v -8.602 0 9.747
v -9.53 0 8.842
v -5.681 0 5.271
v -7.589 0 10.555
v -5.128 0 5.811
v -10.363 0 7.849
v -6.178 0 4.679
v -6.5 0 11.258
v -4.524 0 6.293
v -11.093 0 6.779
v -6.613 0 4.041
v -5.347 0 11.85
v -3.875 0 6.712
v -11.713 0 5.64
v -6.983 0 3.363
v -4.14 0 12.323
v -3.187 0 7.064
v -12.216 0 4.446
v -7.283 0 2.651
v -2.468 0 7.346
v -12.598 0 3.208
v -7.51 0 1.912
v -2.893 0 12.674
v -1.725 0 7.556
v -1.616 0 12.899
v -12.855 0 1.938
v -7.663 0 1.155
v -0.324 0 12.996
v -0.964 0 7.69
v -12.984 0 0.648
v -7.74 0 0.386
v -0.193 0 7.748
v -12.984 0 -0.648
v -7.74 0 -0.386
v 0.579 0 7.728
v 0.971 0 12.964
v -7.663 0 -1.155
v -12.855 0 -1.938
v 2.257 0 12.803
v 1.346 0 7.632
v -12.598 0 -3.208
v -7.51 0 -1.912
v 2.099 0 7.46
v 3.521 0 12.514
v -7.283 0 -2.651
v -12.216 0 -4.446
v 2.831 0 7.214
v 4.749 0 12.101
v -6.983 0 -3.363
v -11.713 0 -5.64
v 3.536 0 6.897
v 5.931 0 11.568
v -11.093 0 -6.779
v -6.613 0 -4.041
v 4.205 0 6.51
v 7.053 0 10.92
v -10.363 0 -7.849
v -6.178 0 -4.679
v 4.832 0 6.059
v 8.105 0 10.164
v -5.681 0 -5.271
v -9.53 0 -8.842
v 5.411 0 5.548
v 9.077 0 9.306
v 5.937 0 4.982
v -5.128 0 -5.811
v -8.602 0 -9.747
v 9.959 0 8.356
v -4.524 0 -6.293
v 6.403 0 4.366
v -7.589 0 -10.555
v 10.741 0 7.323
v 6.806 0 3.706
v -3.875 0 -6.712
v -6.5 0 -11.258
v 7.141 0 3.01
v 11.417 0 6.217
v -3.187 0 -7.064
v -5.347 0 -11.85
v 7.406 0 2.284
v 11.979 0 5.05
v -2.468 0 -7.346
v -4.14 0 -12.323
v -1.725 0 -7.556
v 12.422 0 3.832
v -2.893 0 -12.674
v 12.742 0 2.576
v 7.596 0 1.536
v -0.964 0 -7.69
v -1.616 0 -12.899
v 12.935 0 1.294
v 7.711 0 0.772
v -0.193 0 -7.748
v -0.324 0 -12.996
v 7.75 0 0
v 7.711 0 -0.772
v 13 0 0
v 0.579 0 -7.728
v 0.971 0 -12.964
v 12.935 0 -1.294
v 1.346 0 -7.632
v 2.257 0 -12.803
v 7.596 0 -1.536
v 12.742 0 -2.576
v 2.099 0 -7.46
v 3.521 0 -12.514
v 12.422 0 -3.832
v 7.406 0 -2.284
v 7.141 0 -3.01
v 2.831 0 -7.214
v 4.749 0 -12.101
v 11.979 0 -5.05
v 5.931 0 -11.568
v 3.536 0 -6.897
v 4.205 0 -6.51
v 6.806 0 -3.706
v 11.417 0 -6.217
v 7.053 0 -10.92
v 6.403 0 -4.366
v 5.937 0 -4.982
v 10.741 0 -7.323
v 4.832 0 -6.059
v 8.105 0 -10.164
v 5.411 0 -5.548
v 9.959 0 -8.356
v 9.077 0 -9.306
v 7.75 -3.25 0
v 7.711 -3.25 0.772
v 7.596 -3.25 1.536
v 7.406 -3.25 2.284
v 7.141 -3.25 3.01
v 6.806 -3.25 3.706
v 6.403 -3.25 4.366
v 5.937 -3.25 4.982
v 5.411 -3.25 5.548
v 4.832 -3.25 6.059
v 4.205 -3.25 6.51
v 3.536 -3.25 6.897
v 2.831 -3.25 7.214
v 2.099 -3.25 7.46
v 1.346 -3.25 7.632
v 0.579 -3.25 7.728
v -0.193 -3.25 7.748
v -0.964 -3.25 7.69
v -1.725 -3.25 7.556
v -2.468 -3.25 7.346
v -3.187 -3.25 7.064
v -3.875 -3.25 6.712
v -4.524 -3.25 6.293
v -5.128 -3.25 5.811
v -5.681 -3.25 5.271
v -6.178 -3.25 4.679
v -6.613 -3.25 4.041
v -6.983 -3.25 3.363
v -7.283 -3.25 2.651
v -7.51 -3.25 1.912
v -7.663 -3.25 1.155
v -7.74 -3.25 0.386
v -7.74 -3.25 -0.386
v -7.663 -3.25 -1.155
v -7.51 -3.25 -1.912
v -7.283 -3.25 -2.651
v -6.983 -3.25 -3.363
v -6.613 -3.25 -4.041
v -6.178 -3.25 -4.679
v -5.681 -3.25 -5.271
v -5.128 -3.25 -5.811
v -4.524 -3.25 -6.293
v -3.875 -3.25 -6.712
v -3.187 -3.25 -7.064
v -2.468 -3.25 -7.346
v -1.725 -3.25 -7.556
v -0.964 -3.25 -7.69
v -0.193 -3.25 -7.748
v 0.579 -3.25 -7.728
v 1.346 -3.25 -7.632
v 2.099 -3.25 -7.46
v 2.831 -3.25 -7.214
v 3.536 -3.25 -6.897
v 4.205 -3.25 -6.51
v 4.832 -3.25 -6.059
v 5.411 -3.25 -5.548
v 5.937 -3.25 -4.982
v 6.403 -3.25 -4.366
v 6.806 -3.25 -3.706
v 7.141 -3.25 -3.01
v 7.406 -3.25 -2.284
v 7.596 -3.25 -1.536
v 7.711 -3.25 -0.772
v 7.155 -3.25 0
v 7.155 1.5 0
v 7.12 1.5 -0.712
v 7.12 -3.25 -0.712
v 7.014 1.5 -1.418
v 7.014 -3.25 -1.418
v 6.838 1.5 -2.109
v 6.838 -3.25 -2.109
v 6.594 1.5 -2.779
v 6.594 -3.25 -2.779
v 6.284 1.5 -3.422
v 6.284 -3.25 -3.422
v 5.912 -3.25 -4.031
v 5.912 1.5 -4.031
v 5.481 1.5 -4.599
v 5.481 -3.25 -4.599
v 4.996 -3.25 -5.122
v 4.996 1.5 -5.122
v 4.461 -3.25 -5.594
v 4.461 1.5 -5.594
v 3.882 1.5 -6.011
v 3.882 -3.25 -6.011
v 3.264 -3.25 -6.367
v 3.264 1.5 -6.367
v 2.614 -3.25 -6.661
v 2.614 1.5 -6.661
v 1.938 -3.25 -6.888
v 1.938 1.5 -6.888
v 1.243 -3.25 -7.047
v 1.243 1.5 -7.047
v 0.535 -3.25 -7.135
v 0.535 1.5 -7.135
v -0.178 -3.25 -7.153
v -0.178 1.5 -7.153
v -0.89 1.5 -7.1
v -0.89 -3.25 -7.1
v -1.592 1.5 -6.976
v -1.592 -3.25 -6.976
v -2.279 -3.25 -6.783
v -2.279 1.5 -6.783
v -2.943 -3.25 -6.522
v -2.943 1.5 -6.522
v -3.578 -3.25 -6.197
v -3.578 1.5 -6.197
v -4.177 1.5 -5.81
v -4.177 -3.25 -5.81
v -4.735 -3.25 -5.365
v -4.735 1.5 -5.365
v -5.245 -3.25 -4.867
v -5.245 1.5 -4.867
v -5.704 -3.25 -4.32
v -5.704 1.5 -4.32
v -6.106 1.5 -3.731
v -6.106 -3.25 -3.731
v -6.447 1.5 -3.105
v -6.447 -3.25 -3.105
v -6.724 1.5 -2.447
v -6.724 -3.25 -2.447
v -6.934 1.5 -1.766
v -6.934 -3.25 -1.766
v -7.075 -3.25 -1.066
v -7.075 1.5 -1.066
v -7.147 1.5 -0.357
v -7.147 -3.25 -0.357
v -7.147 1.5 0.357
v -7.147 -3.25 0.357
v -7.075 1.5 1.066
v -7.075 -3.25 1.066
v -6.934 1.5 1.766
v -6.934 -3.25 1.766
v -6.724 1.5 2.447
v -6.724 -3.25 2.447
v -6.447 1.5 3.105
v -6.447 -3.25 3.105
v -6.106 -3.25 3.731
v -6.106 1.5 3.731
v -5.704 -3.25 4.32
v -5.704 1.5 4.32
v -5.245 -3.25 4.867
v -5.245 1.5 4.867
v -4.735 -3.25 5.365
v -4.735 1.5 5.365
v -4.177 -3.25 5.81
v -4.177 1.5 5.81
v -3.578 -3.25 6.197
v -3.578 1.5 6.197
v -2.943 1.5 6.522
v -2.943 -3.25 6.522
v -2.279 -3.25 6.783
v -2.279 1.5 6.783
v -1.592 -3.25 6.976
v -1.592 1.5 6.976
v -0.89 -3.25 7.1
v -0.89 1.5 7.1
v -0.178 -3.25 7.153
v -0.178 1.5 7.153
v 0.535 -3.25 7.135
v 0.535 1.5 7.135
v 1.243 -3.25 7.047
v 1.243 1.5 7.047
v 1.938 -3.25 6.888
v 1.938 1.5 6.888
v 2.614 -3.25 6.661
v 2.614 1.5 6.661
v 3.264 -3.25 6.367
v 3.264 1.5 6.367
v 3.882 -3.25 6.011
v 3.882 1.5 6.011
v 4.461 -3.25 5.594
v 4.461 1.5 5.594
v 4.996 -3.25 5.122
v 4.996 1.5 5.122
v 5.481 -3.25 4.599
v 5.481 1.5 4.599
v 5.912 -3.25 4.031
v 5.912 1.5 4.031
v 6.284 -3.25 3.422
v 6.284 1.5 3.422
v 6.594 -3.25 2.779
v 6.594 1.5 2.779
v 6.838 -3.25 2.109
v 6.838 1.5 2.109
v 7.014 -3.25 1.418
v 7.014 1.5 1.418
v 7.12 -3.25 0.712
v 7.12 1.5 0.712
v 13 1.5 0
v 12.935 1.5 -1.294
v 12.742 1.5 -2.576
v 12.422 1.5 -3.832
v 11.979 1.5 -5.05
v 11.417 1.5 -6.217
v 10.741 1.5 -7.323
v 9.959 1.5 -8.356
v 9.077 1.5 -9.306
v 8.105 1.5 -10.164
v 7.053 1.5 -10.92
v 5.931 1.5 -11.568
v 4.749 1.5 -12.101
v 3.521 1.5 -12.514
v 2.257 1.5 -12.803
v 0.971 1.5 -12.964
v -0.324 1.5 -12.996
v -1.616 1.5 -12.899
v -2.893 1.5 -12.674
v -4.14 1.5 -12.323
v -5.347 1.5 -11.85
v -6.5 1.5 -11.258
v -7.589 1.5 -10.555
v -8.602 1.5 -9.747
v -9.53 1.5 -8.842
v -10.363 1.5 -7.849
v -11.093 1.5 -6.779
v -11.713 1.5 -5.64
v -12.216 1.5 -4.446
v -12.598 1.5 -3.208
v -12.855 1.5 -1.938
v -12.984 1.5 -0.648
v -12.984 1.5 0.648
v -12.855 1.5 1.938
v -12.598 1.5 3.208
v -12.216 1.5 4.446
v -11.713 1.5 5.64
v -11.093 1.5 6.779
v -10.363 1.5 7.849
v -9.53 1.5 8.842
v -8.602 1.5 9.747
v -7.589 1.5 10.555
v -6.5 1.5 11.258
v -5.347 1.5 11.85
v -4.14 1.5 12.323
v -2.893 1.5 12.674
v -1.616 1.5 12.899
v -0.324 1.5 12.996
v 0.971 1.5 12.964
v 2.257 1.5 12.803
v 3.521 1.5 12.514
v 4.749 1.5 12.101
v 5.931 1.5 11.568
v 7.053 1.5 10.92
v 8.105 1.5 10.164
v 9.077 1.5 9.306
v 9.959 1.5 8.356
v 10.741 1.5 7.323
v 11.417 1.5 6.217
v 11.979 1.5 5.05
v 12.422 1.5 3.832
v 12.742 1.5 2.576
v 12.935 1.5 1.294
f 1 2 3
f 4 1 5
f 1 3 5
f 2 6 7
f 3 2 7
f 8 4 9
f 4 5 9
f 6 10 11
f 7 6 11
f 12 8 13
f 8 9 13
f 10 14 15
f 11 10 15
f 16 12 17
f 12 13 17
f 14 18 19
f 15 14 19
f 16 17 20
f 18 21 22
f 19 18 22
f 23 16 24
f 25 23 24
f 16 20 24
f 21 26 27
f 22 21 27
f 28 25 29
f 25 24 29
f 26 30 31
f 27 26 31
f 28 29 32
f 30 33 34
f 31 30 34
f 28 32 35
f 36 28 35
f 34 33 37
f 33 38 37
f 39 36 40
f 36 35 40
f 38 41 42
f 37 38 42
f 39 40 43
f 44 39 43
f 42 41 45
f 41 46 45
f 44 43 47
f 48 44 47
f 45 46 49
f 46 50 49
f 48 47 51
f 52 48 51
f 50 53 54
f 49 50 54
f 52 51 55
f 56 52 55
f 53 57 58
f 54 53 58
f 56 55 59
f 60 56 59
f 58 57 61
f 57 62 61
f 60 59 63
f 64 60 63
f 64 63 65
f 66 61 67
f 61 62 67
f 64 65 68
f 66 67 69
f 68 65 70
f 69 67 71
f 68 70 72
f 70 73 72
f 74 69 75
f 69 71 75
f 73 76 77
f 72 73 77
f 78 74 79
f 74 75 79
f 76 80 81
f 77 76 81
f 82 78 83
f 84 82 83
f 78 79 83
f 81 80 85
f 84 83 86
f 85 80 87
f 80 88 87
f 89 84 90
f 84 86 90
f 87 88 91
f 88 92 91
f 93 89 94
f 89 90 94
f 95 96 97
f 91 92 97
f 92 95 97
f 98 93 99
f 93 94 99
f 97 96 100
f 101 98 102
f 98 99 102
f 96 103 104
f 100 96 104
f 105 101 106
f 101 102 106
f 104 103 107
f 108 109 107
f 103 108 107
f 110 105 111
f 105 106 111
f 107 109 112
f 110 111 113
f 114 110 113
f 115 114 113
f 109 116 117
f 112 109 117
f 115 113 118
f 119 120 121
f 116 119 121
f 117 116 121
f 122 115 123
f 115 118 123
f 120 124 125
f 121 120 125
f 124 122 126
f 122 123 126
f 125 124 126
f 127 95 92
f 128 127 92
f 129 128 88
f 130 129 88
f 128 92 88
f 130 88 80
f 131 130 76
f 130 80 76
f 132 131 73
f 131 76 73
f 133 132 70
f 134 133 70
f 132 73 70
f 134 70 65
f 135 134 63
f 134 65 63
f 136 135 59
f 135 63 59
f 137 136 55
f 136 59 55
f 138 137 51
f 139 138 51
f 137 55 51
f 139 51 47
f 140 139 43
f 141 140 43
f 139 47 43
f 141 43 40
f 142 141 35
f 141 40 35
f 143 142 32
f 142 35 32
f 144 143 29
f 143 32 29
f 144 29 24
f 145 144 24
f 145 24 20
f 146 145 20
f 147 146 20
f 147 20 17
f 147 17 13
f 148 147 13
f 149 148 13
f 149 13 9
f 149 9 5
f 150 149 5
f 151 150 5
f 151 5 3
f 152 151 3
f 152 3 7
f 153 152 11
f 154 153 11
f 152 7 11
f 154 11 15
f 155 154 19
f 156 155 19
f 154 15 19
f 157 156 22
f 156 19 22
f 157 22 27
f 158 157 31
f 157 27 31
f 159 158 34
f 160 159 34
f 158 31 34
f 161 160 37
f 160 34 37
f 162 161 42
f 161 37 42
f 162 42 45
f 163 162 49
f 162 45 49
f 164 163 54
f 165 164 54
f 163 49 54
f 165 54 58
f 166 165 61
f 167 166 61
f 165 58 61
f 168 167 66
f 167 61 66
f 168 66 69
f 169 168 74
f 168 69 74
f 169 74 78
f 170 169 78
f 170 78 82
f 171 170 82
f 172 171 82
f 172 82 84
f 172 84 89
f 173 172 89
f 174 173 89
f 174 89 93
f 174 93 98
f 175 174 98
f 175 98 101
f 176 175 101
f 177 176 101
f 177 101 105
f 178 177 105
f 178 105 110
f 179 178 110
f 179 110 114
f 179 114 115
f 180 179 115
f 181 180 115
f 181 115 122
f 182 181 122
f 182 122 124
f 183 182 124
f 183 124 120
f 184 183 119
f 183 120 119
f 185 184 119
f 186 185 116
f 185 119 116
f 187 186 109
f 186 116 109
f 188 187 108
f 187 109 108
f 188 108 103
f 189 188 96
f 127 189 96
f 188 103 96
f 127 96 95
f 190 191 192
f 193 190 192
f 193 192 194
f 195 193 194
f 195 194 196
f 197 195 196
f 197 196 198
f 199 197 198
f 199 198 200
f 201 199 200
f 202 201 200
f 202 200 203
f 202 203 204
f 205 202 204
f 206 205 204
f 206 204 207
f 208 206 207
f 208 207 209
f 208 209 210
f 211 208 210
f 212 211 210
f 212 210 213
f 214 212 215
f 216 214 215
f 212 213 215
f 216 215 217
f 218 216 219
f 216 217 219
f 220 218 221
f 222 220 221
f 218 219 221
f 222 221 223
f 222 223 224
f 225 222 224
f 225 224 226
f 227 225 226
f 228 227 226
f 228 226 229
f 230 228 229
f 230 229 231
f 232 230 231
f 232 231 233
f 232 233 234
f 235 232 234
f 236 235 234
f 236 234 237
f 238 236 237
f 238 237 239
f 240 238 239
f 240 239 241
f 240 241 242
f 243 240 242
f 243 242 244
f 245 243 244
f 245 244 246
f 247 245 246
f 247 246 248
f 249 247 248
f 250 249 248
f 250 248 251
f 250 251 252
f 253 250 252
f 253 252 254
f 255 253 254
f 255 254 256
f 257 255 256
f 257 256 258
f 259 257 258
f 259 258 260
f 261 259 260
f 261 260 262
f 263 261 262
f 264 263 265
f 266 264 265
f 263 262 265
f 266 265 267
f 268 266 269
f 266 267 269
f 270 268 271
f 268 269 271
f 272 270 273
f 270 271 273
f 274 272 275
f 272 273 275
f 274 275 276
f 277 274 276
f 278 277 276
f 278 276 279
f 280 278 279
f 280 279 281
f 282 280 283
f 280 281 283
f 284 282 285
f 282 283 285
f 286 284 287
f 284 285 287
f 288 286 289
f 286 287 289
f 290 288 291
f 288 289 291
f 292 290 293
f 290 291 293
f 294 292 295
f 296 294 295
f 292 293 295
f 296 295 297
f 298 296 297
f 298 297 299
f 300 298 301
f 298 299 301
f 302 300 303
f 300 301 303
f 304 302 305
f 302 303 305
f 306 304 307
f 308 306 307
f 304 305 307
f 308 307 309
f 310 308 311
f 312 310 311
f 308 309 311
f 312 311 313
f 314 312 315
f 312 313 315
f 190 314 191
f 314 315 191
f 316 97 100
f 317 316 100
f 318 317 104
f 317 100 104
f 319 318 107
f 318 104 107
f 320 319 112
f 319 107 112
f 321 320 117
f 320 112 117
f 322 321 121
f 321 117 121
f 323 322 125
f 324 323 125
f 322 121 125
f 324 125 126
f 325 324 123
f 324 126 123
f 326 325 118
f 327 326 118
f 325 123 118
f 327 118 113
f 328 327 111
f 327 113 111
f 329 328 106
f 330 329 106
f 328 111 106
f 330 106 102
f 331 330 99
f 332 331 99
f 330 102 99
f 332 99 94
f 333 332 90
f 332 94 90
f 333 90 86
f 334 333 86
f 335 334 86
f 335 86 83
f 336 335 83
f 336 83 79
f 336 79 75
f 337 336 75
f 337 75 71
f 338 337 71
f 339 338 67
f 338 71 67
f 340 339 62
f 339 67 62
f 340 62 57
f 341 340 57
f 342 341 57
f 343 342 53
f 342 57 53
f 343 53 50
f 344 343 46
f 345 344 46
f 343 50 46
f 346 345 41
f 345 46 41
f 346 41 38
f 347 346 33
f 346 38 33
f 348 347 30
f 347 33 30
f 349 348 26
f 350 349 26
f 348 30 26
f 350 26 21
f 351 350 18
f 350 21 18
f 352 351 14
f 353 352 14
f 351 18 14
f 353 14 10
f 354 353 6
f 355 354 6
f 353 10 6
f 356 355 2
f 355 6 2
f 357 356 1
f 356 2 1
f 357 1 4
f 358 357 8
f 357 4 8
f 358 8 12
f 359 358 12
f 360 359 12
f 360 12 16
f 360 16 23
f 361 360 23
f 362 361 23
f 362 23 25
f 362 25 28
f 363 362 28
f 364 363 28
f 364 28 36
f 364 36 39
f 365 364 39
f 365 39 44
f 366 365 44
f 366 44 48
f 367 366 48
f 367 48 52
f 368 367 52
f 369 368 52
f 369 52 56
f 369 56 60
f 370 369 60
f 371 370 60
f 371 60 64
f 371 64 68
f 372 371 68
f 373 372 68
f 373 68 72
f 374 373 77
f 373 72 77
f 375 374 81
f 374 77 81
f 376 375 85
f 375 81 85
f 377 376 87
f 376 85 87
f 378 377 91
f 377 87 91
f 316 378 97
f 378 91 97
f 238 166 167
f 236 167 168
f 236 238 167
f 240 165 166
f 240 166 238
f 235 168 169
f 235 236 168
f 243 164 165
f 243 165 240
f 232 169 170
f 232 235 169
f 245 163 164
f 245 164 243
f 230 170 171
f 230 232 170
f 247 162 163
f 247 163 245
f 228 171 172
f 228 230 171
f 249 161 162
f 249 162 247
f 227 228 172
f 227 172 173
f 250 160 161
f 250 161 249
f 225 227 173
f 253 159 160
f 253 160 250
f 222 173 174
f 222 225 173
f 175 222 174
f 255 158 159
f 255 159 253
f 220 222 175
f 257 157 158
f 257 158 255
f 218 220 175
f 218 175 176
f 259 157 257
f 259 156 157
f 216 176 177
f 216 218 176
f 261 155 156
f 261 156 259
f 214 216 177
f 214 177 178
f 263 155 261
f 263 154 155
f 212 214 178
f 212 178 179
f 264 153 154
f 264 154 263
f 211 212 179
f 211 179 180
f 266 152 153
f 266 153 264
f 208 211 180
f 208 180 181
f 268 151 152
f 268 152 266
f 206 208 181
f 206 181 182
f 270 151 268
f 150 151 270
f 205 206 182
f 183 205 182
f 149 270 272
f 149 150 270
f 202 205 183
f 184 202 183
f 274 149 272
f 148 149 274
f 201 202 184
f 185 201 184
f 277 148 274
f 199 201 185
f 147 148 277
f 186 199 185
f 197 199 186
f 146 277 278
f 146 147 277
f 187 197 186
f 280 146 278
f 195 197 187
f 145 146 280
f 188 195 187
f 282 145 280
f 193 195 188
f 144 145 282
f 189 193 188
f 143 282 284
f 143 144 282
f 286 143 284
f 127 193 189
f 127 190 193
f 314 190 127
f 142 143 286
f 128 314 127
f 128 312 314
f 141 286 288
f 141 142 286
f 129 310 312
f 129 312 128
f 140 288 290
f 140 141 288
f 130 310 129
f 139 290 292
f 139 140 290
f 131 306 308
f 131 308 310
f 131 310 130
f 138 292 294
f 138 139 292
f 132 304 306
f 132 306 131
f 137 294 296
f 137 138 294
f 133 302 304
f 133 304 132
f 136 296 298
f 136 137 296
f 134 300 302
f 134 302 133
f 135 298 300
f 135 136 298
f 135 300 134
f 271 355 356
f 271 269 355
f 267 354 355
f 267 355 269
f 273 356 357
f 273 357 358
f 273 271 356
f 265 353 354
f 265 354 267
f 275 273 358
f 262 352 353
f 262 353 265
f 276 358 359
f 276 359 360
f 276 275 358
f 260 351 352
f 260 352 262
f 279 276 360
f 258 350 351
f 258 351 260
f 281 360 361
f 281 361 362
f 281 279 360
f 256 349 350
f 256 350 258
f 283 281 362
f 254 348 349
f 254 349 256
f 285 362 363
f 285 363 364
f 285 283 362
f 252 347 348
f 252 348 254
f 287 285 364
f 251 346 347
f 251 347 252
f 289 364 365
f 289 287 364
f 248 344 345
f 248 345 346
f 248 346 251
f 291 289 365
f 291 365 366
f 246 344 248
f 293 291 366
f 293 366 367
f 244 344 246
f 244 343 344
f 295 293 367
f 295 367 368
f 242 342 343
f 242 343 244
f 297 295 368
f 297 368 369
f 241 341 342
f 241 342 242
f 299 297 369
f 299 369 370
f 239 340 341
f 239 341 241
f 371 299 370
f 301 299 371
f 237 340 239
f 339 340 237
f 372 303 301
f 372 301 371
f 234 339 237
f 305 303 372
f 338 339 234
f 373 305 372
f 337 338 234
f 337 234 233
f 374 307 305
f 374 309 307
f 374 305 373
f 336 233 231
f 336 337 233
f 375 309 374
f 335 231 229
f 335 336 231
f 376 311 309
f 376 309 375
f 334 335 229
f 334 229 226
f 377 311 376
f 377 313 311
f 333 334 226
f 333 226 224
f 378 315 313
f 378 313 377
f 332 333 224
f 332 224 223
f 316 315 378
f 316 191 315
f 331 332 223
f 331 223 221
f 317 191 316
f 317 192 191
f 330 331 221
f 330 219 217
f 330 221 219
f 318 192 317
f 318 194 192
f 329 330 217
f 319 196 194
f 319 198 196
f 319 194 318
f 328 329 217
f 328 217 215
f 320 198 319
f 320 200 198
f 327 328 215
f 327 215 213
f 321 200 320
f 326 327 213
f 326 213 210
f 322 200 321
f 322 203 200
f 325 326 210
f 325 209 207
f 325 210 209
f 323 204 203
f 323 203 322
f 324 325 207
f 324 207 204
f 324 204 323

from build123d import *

# Parameters (mm, degrees)
SKETCH1_R           = 13
BOSS_EXTRUDE1_DEPTH = 1.5
SKETCH2_R           = 7.75
BOSS_EXTRUDE2_DEPTH = 3.25
SKETCH3_R           = 7.1554
CUT_EXTRUDE1_DEPTH  = 5.75


with BuildPart() as part:
    # Sketch1 → Boss-Extrude1 (new body)
    with BuildSketch(Plane(origin=(0, 0, 0), x_dir=(1, 0, 0), z_dir=(0, 1, 0))):
        Circle(SKETCH1_R)
    extrude(amount=BOSS_EXTRUDE1_DEPTH)

    # Sketch2 → Boss-Extrude2 (add)
    with BuildSketch(Plane.XZ):
        Circle(SKETCH2_R)
    extrude(amount=BOSS_EXTRUDE2_DEPTH)

    # Sketch3 → Cut-Extrude1 (cut, through all)
    with BuildSketch(Plane(origin=(0, 1.5, 0), x_dir=(1, 0, 0), z_dir=(0, 1, 0))):
        Circle(SKETCH3_R)
    extrude(amount=-CUT_EXTRUDE1_DEPTH, mode=Mode.SUBTRACT)


solid = part.part
